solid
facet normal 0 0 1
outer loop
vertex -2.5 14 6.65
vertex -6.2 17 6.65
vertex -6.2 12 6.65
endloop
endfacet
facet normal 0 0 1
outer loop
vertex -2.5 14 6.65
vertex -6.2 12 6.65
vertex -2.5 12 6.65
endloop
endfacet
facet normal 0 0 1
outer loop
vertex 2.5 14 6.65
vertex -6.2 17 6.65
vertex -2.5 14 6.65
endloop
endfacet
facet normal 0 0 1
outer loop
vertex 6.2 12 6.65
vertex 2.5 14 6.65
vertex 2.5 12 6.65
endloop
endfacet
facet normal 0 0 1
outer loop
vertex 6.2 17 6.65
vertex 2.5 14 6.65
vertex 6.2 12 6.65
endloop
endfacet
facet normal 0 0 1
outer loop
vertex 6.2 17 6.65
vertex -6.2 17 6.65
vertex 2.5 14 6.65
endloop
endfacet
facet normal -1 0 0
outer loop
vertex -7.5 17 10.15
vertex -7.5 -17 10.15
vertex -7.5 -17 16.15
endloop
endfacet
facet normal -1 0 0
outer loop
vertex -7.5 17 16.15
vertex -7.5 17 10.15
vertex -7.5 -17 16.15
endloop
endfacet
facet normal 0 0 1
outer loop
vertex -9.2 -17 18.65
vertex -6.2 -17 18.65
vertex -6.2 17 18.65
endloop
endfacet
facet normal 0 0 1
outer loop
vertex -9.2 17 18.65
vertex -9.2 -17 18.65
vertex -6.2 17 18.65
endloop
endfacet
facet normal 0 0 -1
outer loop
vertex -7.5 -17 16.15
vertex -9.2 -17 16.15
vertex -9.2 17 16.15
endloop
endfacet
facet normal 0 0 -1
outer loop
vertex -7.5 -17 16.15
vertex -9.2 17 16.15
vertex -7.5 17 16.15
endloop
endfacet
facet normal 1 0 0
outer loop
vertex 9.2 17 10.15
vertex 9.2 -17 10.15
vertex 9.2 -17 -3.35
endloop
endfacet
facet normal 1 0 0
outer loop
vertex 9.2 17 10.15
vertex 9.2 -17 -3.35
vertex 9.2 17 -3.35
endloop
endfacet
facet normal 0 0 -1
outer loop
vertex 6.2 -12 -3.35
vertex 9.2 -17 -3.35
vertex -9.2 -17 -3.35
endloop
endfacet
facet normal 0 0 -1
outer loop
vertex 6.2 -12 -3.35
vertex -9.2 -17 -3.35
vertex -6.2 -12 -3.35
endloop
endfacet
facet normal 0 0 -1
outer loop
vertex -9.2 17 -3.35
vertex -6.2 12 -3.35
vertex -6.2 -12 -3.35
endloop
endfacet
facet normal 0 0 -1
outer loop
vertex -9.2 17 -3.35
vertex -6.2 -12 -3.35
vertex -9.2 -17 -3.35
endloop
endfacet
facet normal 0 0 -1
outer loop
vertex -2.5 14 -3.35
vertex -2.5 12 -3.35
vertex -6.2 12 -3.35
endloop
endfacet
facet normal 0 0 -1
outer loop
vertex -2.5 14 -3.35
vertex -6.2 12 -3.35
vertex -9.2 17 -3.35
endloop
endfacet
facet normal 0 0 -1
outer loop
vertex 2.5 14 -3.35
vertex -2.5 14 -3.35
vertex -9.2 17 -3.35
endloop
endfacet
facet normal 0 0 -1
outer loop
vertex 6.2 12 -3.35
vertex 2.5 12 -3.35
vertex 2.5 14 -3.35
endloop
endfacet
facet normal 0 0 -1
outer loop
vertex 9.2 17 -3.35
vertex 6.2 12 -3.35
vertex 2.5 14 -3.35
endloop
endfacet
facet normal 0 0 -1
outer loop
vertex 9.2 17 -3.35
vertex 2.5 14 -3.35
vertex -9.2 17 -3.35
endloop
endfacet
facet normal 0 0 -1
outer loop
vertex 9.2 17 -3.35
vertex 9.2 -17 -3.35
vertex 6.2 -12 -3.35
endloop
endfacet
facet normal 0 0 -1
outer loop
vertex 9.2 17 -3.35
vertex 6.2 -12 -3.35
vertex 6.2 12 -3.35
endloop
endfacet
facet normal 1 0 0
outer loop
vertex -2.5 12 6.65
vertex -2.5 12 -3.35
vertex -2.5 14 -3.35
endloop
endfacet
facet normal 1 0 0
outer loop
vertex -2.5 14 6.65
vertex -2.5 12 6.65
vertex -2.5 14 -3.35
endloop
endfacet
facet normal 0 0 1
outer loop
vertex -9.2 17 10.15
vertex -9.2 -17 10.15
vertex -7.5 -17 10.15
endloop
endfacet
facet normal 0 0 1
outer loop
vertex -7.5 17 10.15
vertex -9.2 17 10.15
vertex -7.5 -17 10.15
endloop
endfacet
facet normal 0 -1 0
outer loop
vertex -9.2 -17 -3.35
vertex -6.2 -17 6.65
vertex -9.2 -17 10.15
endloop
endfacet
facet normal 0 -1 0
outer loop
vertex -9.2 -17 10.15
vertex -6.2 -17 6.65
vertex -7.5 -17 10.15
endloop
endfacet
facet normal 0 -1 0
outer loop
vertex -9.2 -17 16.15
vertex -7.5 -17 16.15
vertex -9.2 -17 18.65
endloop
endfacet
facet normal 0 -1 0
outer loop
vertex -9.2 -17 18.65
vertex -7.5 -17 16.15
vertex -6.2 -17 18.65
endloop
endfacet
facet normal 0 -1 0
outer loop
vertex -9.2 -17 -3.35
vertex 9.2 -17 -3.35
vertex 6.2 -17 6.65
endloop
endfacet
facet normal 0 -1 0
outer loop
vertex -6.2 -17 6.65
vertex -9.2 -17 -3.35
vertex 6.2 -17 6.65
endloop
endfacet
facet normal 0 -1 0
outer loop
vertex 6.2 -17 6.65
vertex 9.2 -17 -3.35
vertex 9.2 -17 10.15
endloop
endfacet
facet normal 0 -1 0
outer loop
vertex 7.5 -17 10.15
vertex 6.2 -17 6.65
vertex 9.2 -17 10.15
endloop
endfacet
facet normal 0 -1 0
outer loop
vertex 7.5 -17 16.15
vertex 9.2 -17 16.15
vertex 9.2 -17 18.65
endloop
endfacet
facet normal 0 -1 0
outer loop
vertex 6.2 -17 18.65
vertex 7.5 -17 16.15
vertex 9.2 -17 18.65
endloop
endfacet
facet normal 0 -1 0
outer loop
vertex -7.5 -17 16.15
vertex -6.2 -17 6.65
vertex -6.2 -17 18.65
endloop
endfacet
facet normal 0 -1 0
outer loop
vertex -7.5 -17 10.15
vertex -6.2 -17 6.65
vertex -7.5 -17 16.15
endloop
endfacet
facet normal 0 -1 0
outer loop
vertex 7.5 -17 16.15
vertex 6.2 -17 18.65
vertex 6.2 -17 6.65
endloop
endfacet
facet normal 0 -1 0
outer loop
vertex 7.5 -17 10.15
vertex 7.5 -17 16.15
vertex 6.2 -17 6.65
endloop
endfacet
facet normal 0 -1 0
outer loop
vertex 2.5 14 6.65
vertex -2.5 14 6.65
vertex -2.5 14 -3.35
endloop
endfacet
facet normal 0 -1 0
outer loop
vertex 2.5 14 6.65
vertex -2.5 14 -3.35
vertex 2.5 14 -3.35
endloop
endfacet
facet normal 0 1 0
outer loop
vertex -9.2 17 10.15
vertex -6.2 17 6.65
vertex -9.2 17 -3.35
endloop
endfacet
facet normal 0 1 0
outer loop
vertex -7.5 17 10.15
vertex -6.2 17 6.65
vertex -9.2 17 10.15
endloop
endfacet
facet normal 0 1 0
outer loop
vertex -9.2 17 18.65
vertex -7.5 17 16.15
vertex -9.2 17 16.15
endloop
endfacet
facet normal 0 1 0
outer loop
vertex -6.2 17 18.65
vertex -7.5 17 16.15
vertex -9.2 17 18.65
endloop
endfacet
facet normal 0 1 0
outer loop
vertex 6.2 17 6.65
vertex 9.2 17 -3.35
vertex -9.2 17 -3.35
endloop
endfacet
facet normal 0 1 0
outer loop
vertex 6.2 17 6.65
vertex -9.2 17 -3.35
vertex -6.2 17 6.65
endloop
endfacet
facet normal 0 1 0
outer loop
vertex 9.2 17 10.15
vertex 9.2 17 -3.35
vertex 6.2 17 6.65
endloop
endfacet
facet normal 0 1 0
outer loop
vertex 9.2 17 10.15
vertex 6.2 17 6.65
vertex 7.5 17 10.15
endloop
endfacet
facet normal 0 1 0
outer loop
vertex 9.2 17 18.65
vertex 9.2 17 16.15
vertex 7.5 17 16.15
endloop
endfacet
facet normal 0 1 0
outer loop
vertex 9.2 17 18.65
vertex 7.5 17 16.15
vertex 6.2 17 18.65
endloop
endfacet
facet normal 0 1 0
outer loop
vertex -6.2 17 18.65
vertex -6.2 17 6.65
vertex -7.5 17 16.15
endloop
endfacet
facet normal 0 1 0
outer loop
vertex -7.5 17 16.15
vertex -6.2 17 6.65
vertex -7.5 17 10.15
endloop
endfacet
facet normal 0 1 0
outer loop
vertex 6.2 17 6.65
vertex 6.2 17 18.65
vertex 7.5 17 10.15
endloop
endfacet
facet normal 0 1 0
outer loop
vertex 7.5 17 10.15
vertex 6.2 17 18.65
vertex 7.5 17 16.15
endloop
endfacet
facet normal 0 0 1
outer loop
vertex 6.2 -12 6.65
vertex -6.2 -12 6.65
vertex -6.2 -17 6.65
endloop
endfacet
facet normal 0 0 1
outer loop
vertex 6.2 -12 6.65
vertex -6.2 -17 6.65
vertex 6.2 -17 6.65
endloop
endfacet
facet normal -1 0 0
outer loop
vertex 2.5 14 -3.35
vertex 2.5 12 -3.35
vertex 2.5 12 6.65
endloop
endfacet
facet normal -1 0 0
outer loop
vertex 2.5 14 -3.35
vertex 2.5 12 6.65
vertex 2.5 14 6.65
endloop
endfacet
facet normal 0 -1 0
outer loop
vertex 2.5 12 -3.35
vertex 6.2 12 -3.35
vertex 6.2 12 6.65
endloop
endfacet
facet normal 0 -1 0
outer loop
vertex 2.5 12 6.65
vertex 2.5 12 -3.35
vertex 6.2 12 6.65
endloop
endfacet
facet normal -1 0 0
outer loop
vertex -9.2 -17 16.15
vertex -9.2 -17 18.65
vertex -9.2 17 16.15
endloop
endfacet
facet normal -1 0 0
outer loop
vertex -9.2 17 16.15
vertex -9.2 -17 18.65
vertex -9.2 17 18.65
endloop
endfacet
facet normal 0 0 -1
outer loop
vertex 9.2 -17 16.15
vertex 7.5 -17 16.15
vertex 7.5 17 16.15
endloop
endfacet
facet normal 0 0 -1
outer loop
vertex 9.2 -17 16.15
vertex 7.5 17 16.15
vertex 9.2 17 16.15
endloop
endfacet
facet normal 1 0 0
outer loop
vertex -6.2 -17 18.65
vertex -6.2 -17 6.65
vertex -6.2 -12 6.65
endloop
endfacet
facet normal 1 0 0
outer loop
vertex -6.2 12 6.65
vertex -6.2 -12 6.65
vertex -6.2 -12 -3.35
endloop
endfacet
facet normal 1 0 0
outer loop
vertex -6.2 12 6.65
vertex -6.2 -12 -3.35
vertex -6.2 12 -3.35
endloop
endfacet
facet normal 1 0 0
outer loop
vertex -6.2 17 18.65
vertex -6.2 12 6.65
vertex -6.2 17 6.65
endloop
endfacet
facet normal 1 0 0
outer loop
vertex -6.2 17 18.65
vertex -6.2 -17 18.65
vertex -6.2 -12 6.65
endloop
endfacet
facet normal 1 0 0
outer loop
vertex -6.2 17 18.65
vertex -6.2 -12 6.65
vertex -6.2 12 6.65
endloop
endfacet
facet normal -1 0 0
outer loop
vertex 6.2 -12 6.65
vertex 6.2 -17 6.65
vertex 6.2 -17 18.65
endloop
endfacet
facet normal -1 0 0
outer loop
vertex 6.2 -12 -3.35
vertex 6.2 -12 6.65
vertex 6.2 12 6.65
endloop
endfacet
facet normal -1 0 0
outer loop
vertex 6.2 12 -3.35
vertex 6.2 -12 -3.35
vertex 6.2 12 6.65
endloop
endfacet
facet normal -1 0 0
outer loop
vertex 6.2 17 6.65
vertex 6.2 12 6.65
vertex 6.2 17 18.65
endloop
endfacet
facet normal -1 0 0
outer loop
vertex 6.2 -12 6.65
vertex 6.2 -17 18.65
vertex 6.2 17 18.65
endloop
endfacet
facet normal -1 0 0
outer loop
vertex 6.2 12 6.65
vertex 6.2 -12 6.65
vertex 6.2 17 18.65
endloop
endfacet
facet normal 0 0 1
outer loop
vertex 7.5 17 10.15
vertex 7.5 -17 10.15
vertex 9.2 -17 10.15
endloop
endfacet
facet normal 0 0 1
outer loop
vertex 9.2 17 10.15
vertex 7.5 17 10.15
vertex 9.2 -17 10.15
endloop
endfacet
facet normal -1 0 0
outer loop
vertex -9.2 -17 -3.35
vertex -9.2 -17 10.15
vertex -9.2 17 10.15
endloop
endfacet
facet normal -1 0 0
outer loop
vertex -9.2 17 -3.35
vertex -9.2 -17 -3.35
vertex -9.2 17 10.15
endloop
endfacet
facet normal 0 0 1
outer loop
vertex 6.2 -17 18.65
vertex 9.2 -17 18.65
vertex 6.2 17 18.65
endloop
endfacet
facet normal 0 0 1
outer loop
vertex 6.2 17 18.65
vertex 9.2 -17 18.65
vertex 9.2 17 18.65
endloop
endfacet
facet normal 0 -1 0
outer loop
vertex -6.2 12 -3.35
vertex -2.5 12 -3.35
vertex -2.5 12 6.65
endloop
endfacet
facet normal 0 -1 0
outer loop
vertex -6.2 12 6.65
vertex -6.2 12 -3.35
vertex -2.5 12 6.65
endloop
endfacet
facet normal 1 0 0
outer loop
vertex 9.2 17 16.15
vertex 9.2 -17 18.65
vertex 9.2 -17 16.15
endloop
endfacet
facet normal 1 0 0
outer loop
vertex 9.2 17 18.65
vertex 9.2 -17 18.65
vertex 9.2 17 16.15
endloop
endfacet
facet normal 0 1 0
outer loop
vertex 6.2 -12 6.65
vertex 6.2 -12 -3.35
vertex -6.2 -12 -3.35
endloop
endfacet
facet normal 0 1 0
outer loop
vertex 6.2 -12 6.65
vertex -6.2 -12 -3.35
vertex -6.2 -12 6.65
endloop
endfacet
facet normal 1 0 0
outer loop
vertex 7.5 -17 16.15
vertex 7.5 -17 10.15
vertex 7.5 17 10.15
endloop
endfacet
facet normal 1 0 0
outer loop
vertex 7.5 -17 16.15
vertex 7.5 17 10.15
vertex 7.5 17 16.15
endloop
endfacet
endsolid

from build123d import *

# Parameters (mm, degrees)
F1_W      = 5
F1_H      = 22
F2_DEPTH  = 6.2
F3_W      = 34
F3_H      = 22
F4_DEPTH  = 3
F6_W      = 12.4
F6_H      = 5
F7_DEPTH  = 12
F8_W      = 5
F8_H      = 2
F9_DEPTH  = 25
F10_W     = 1.7
F10_H     = 6
F11_DEPTH = 34.001


with BuildPart() as f2:
    # F1 (on Right) → F2 (new body, symmetric)
    with BuildSketch(Plane.YZ):
        with Locations((-14.5, 7.65)):
            Rectangle(F1_W, F1_H)
    extrude(amount=F2_DEPTH, both=True)



with BuildPart() as f2b:
    # F1 (on Right) → F2, piece 2 (new body, symmetric)
    with BuildSketch(Plane.YZ):
        with Locations((14.5, 7.65)):
            Rectangle(F1_W, F1_H)
    extrude(amount=F2_DEPTH, both=True)


with BuildPart() as f2_1:
    add(f2.part)

    add(f2b.part)  # F4 merges F2b
    # F3 (on face) → F4 (join)
    with BuildSketch(Plane.YZ.offset(6.2)):
        with Locations((0, 7.65)):
            Rectangle(F3_W, F3_H)
    extrude(amount=F4_DEPTH)

    # F5: F2 across plane


with BuildPart() as f2_2:
    add(f2_1.part)
    add(f2_1.part.mirror(Plane.YZ))

    # F6 (on face) → F7 (cut)
    with BuildSketch(Plane.XY.offset(18.65)):
        with Locations((0, -14.5)):
            Rectangle(F6_W, F6_H)
        with Locations((0, 14.5)):
            Rectangle(F6_W, F6_H)
    extrude(amount=-F7_DEPTH, mode=Mode.SUBTRACT)

    # F8 (on face) → F9 (cut)
    with BuildSketch(Plane.XY.offset(6.65)):
        with Locations((0, 13)):
            Rectangle(F8_W, F8_H)
    extrude(amount=-F9_DEPTH, mode=Mode.SUBTRACT)

    # F10 (on face) → F11 (cut, through all)
    with BuildSketch(Plane.XZ.offset(17)):
        with Locations((-8.35, 13.15)):
            Rectangle(F10_W, F10_H)
        with Locations((8.35, 13.15)):
            Rectangle(F10_W, F10_H)
    extrude(amount=-F11_DEPTH, mode=Mode.SUBTRACT)


solid = f2_2.part
